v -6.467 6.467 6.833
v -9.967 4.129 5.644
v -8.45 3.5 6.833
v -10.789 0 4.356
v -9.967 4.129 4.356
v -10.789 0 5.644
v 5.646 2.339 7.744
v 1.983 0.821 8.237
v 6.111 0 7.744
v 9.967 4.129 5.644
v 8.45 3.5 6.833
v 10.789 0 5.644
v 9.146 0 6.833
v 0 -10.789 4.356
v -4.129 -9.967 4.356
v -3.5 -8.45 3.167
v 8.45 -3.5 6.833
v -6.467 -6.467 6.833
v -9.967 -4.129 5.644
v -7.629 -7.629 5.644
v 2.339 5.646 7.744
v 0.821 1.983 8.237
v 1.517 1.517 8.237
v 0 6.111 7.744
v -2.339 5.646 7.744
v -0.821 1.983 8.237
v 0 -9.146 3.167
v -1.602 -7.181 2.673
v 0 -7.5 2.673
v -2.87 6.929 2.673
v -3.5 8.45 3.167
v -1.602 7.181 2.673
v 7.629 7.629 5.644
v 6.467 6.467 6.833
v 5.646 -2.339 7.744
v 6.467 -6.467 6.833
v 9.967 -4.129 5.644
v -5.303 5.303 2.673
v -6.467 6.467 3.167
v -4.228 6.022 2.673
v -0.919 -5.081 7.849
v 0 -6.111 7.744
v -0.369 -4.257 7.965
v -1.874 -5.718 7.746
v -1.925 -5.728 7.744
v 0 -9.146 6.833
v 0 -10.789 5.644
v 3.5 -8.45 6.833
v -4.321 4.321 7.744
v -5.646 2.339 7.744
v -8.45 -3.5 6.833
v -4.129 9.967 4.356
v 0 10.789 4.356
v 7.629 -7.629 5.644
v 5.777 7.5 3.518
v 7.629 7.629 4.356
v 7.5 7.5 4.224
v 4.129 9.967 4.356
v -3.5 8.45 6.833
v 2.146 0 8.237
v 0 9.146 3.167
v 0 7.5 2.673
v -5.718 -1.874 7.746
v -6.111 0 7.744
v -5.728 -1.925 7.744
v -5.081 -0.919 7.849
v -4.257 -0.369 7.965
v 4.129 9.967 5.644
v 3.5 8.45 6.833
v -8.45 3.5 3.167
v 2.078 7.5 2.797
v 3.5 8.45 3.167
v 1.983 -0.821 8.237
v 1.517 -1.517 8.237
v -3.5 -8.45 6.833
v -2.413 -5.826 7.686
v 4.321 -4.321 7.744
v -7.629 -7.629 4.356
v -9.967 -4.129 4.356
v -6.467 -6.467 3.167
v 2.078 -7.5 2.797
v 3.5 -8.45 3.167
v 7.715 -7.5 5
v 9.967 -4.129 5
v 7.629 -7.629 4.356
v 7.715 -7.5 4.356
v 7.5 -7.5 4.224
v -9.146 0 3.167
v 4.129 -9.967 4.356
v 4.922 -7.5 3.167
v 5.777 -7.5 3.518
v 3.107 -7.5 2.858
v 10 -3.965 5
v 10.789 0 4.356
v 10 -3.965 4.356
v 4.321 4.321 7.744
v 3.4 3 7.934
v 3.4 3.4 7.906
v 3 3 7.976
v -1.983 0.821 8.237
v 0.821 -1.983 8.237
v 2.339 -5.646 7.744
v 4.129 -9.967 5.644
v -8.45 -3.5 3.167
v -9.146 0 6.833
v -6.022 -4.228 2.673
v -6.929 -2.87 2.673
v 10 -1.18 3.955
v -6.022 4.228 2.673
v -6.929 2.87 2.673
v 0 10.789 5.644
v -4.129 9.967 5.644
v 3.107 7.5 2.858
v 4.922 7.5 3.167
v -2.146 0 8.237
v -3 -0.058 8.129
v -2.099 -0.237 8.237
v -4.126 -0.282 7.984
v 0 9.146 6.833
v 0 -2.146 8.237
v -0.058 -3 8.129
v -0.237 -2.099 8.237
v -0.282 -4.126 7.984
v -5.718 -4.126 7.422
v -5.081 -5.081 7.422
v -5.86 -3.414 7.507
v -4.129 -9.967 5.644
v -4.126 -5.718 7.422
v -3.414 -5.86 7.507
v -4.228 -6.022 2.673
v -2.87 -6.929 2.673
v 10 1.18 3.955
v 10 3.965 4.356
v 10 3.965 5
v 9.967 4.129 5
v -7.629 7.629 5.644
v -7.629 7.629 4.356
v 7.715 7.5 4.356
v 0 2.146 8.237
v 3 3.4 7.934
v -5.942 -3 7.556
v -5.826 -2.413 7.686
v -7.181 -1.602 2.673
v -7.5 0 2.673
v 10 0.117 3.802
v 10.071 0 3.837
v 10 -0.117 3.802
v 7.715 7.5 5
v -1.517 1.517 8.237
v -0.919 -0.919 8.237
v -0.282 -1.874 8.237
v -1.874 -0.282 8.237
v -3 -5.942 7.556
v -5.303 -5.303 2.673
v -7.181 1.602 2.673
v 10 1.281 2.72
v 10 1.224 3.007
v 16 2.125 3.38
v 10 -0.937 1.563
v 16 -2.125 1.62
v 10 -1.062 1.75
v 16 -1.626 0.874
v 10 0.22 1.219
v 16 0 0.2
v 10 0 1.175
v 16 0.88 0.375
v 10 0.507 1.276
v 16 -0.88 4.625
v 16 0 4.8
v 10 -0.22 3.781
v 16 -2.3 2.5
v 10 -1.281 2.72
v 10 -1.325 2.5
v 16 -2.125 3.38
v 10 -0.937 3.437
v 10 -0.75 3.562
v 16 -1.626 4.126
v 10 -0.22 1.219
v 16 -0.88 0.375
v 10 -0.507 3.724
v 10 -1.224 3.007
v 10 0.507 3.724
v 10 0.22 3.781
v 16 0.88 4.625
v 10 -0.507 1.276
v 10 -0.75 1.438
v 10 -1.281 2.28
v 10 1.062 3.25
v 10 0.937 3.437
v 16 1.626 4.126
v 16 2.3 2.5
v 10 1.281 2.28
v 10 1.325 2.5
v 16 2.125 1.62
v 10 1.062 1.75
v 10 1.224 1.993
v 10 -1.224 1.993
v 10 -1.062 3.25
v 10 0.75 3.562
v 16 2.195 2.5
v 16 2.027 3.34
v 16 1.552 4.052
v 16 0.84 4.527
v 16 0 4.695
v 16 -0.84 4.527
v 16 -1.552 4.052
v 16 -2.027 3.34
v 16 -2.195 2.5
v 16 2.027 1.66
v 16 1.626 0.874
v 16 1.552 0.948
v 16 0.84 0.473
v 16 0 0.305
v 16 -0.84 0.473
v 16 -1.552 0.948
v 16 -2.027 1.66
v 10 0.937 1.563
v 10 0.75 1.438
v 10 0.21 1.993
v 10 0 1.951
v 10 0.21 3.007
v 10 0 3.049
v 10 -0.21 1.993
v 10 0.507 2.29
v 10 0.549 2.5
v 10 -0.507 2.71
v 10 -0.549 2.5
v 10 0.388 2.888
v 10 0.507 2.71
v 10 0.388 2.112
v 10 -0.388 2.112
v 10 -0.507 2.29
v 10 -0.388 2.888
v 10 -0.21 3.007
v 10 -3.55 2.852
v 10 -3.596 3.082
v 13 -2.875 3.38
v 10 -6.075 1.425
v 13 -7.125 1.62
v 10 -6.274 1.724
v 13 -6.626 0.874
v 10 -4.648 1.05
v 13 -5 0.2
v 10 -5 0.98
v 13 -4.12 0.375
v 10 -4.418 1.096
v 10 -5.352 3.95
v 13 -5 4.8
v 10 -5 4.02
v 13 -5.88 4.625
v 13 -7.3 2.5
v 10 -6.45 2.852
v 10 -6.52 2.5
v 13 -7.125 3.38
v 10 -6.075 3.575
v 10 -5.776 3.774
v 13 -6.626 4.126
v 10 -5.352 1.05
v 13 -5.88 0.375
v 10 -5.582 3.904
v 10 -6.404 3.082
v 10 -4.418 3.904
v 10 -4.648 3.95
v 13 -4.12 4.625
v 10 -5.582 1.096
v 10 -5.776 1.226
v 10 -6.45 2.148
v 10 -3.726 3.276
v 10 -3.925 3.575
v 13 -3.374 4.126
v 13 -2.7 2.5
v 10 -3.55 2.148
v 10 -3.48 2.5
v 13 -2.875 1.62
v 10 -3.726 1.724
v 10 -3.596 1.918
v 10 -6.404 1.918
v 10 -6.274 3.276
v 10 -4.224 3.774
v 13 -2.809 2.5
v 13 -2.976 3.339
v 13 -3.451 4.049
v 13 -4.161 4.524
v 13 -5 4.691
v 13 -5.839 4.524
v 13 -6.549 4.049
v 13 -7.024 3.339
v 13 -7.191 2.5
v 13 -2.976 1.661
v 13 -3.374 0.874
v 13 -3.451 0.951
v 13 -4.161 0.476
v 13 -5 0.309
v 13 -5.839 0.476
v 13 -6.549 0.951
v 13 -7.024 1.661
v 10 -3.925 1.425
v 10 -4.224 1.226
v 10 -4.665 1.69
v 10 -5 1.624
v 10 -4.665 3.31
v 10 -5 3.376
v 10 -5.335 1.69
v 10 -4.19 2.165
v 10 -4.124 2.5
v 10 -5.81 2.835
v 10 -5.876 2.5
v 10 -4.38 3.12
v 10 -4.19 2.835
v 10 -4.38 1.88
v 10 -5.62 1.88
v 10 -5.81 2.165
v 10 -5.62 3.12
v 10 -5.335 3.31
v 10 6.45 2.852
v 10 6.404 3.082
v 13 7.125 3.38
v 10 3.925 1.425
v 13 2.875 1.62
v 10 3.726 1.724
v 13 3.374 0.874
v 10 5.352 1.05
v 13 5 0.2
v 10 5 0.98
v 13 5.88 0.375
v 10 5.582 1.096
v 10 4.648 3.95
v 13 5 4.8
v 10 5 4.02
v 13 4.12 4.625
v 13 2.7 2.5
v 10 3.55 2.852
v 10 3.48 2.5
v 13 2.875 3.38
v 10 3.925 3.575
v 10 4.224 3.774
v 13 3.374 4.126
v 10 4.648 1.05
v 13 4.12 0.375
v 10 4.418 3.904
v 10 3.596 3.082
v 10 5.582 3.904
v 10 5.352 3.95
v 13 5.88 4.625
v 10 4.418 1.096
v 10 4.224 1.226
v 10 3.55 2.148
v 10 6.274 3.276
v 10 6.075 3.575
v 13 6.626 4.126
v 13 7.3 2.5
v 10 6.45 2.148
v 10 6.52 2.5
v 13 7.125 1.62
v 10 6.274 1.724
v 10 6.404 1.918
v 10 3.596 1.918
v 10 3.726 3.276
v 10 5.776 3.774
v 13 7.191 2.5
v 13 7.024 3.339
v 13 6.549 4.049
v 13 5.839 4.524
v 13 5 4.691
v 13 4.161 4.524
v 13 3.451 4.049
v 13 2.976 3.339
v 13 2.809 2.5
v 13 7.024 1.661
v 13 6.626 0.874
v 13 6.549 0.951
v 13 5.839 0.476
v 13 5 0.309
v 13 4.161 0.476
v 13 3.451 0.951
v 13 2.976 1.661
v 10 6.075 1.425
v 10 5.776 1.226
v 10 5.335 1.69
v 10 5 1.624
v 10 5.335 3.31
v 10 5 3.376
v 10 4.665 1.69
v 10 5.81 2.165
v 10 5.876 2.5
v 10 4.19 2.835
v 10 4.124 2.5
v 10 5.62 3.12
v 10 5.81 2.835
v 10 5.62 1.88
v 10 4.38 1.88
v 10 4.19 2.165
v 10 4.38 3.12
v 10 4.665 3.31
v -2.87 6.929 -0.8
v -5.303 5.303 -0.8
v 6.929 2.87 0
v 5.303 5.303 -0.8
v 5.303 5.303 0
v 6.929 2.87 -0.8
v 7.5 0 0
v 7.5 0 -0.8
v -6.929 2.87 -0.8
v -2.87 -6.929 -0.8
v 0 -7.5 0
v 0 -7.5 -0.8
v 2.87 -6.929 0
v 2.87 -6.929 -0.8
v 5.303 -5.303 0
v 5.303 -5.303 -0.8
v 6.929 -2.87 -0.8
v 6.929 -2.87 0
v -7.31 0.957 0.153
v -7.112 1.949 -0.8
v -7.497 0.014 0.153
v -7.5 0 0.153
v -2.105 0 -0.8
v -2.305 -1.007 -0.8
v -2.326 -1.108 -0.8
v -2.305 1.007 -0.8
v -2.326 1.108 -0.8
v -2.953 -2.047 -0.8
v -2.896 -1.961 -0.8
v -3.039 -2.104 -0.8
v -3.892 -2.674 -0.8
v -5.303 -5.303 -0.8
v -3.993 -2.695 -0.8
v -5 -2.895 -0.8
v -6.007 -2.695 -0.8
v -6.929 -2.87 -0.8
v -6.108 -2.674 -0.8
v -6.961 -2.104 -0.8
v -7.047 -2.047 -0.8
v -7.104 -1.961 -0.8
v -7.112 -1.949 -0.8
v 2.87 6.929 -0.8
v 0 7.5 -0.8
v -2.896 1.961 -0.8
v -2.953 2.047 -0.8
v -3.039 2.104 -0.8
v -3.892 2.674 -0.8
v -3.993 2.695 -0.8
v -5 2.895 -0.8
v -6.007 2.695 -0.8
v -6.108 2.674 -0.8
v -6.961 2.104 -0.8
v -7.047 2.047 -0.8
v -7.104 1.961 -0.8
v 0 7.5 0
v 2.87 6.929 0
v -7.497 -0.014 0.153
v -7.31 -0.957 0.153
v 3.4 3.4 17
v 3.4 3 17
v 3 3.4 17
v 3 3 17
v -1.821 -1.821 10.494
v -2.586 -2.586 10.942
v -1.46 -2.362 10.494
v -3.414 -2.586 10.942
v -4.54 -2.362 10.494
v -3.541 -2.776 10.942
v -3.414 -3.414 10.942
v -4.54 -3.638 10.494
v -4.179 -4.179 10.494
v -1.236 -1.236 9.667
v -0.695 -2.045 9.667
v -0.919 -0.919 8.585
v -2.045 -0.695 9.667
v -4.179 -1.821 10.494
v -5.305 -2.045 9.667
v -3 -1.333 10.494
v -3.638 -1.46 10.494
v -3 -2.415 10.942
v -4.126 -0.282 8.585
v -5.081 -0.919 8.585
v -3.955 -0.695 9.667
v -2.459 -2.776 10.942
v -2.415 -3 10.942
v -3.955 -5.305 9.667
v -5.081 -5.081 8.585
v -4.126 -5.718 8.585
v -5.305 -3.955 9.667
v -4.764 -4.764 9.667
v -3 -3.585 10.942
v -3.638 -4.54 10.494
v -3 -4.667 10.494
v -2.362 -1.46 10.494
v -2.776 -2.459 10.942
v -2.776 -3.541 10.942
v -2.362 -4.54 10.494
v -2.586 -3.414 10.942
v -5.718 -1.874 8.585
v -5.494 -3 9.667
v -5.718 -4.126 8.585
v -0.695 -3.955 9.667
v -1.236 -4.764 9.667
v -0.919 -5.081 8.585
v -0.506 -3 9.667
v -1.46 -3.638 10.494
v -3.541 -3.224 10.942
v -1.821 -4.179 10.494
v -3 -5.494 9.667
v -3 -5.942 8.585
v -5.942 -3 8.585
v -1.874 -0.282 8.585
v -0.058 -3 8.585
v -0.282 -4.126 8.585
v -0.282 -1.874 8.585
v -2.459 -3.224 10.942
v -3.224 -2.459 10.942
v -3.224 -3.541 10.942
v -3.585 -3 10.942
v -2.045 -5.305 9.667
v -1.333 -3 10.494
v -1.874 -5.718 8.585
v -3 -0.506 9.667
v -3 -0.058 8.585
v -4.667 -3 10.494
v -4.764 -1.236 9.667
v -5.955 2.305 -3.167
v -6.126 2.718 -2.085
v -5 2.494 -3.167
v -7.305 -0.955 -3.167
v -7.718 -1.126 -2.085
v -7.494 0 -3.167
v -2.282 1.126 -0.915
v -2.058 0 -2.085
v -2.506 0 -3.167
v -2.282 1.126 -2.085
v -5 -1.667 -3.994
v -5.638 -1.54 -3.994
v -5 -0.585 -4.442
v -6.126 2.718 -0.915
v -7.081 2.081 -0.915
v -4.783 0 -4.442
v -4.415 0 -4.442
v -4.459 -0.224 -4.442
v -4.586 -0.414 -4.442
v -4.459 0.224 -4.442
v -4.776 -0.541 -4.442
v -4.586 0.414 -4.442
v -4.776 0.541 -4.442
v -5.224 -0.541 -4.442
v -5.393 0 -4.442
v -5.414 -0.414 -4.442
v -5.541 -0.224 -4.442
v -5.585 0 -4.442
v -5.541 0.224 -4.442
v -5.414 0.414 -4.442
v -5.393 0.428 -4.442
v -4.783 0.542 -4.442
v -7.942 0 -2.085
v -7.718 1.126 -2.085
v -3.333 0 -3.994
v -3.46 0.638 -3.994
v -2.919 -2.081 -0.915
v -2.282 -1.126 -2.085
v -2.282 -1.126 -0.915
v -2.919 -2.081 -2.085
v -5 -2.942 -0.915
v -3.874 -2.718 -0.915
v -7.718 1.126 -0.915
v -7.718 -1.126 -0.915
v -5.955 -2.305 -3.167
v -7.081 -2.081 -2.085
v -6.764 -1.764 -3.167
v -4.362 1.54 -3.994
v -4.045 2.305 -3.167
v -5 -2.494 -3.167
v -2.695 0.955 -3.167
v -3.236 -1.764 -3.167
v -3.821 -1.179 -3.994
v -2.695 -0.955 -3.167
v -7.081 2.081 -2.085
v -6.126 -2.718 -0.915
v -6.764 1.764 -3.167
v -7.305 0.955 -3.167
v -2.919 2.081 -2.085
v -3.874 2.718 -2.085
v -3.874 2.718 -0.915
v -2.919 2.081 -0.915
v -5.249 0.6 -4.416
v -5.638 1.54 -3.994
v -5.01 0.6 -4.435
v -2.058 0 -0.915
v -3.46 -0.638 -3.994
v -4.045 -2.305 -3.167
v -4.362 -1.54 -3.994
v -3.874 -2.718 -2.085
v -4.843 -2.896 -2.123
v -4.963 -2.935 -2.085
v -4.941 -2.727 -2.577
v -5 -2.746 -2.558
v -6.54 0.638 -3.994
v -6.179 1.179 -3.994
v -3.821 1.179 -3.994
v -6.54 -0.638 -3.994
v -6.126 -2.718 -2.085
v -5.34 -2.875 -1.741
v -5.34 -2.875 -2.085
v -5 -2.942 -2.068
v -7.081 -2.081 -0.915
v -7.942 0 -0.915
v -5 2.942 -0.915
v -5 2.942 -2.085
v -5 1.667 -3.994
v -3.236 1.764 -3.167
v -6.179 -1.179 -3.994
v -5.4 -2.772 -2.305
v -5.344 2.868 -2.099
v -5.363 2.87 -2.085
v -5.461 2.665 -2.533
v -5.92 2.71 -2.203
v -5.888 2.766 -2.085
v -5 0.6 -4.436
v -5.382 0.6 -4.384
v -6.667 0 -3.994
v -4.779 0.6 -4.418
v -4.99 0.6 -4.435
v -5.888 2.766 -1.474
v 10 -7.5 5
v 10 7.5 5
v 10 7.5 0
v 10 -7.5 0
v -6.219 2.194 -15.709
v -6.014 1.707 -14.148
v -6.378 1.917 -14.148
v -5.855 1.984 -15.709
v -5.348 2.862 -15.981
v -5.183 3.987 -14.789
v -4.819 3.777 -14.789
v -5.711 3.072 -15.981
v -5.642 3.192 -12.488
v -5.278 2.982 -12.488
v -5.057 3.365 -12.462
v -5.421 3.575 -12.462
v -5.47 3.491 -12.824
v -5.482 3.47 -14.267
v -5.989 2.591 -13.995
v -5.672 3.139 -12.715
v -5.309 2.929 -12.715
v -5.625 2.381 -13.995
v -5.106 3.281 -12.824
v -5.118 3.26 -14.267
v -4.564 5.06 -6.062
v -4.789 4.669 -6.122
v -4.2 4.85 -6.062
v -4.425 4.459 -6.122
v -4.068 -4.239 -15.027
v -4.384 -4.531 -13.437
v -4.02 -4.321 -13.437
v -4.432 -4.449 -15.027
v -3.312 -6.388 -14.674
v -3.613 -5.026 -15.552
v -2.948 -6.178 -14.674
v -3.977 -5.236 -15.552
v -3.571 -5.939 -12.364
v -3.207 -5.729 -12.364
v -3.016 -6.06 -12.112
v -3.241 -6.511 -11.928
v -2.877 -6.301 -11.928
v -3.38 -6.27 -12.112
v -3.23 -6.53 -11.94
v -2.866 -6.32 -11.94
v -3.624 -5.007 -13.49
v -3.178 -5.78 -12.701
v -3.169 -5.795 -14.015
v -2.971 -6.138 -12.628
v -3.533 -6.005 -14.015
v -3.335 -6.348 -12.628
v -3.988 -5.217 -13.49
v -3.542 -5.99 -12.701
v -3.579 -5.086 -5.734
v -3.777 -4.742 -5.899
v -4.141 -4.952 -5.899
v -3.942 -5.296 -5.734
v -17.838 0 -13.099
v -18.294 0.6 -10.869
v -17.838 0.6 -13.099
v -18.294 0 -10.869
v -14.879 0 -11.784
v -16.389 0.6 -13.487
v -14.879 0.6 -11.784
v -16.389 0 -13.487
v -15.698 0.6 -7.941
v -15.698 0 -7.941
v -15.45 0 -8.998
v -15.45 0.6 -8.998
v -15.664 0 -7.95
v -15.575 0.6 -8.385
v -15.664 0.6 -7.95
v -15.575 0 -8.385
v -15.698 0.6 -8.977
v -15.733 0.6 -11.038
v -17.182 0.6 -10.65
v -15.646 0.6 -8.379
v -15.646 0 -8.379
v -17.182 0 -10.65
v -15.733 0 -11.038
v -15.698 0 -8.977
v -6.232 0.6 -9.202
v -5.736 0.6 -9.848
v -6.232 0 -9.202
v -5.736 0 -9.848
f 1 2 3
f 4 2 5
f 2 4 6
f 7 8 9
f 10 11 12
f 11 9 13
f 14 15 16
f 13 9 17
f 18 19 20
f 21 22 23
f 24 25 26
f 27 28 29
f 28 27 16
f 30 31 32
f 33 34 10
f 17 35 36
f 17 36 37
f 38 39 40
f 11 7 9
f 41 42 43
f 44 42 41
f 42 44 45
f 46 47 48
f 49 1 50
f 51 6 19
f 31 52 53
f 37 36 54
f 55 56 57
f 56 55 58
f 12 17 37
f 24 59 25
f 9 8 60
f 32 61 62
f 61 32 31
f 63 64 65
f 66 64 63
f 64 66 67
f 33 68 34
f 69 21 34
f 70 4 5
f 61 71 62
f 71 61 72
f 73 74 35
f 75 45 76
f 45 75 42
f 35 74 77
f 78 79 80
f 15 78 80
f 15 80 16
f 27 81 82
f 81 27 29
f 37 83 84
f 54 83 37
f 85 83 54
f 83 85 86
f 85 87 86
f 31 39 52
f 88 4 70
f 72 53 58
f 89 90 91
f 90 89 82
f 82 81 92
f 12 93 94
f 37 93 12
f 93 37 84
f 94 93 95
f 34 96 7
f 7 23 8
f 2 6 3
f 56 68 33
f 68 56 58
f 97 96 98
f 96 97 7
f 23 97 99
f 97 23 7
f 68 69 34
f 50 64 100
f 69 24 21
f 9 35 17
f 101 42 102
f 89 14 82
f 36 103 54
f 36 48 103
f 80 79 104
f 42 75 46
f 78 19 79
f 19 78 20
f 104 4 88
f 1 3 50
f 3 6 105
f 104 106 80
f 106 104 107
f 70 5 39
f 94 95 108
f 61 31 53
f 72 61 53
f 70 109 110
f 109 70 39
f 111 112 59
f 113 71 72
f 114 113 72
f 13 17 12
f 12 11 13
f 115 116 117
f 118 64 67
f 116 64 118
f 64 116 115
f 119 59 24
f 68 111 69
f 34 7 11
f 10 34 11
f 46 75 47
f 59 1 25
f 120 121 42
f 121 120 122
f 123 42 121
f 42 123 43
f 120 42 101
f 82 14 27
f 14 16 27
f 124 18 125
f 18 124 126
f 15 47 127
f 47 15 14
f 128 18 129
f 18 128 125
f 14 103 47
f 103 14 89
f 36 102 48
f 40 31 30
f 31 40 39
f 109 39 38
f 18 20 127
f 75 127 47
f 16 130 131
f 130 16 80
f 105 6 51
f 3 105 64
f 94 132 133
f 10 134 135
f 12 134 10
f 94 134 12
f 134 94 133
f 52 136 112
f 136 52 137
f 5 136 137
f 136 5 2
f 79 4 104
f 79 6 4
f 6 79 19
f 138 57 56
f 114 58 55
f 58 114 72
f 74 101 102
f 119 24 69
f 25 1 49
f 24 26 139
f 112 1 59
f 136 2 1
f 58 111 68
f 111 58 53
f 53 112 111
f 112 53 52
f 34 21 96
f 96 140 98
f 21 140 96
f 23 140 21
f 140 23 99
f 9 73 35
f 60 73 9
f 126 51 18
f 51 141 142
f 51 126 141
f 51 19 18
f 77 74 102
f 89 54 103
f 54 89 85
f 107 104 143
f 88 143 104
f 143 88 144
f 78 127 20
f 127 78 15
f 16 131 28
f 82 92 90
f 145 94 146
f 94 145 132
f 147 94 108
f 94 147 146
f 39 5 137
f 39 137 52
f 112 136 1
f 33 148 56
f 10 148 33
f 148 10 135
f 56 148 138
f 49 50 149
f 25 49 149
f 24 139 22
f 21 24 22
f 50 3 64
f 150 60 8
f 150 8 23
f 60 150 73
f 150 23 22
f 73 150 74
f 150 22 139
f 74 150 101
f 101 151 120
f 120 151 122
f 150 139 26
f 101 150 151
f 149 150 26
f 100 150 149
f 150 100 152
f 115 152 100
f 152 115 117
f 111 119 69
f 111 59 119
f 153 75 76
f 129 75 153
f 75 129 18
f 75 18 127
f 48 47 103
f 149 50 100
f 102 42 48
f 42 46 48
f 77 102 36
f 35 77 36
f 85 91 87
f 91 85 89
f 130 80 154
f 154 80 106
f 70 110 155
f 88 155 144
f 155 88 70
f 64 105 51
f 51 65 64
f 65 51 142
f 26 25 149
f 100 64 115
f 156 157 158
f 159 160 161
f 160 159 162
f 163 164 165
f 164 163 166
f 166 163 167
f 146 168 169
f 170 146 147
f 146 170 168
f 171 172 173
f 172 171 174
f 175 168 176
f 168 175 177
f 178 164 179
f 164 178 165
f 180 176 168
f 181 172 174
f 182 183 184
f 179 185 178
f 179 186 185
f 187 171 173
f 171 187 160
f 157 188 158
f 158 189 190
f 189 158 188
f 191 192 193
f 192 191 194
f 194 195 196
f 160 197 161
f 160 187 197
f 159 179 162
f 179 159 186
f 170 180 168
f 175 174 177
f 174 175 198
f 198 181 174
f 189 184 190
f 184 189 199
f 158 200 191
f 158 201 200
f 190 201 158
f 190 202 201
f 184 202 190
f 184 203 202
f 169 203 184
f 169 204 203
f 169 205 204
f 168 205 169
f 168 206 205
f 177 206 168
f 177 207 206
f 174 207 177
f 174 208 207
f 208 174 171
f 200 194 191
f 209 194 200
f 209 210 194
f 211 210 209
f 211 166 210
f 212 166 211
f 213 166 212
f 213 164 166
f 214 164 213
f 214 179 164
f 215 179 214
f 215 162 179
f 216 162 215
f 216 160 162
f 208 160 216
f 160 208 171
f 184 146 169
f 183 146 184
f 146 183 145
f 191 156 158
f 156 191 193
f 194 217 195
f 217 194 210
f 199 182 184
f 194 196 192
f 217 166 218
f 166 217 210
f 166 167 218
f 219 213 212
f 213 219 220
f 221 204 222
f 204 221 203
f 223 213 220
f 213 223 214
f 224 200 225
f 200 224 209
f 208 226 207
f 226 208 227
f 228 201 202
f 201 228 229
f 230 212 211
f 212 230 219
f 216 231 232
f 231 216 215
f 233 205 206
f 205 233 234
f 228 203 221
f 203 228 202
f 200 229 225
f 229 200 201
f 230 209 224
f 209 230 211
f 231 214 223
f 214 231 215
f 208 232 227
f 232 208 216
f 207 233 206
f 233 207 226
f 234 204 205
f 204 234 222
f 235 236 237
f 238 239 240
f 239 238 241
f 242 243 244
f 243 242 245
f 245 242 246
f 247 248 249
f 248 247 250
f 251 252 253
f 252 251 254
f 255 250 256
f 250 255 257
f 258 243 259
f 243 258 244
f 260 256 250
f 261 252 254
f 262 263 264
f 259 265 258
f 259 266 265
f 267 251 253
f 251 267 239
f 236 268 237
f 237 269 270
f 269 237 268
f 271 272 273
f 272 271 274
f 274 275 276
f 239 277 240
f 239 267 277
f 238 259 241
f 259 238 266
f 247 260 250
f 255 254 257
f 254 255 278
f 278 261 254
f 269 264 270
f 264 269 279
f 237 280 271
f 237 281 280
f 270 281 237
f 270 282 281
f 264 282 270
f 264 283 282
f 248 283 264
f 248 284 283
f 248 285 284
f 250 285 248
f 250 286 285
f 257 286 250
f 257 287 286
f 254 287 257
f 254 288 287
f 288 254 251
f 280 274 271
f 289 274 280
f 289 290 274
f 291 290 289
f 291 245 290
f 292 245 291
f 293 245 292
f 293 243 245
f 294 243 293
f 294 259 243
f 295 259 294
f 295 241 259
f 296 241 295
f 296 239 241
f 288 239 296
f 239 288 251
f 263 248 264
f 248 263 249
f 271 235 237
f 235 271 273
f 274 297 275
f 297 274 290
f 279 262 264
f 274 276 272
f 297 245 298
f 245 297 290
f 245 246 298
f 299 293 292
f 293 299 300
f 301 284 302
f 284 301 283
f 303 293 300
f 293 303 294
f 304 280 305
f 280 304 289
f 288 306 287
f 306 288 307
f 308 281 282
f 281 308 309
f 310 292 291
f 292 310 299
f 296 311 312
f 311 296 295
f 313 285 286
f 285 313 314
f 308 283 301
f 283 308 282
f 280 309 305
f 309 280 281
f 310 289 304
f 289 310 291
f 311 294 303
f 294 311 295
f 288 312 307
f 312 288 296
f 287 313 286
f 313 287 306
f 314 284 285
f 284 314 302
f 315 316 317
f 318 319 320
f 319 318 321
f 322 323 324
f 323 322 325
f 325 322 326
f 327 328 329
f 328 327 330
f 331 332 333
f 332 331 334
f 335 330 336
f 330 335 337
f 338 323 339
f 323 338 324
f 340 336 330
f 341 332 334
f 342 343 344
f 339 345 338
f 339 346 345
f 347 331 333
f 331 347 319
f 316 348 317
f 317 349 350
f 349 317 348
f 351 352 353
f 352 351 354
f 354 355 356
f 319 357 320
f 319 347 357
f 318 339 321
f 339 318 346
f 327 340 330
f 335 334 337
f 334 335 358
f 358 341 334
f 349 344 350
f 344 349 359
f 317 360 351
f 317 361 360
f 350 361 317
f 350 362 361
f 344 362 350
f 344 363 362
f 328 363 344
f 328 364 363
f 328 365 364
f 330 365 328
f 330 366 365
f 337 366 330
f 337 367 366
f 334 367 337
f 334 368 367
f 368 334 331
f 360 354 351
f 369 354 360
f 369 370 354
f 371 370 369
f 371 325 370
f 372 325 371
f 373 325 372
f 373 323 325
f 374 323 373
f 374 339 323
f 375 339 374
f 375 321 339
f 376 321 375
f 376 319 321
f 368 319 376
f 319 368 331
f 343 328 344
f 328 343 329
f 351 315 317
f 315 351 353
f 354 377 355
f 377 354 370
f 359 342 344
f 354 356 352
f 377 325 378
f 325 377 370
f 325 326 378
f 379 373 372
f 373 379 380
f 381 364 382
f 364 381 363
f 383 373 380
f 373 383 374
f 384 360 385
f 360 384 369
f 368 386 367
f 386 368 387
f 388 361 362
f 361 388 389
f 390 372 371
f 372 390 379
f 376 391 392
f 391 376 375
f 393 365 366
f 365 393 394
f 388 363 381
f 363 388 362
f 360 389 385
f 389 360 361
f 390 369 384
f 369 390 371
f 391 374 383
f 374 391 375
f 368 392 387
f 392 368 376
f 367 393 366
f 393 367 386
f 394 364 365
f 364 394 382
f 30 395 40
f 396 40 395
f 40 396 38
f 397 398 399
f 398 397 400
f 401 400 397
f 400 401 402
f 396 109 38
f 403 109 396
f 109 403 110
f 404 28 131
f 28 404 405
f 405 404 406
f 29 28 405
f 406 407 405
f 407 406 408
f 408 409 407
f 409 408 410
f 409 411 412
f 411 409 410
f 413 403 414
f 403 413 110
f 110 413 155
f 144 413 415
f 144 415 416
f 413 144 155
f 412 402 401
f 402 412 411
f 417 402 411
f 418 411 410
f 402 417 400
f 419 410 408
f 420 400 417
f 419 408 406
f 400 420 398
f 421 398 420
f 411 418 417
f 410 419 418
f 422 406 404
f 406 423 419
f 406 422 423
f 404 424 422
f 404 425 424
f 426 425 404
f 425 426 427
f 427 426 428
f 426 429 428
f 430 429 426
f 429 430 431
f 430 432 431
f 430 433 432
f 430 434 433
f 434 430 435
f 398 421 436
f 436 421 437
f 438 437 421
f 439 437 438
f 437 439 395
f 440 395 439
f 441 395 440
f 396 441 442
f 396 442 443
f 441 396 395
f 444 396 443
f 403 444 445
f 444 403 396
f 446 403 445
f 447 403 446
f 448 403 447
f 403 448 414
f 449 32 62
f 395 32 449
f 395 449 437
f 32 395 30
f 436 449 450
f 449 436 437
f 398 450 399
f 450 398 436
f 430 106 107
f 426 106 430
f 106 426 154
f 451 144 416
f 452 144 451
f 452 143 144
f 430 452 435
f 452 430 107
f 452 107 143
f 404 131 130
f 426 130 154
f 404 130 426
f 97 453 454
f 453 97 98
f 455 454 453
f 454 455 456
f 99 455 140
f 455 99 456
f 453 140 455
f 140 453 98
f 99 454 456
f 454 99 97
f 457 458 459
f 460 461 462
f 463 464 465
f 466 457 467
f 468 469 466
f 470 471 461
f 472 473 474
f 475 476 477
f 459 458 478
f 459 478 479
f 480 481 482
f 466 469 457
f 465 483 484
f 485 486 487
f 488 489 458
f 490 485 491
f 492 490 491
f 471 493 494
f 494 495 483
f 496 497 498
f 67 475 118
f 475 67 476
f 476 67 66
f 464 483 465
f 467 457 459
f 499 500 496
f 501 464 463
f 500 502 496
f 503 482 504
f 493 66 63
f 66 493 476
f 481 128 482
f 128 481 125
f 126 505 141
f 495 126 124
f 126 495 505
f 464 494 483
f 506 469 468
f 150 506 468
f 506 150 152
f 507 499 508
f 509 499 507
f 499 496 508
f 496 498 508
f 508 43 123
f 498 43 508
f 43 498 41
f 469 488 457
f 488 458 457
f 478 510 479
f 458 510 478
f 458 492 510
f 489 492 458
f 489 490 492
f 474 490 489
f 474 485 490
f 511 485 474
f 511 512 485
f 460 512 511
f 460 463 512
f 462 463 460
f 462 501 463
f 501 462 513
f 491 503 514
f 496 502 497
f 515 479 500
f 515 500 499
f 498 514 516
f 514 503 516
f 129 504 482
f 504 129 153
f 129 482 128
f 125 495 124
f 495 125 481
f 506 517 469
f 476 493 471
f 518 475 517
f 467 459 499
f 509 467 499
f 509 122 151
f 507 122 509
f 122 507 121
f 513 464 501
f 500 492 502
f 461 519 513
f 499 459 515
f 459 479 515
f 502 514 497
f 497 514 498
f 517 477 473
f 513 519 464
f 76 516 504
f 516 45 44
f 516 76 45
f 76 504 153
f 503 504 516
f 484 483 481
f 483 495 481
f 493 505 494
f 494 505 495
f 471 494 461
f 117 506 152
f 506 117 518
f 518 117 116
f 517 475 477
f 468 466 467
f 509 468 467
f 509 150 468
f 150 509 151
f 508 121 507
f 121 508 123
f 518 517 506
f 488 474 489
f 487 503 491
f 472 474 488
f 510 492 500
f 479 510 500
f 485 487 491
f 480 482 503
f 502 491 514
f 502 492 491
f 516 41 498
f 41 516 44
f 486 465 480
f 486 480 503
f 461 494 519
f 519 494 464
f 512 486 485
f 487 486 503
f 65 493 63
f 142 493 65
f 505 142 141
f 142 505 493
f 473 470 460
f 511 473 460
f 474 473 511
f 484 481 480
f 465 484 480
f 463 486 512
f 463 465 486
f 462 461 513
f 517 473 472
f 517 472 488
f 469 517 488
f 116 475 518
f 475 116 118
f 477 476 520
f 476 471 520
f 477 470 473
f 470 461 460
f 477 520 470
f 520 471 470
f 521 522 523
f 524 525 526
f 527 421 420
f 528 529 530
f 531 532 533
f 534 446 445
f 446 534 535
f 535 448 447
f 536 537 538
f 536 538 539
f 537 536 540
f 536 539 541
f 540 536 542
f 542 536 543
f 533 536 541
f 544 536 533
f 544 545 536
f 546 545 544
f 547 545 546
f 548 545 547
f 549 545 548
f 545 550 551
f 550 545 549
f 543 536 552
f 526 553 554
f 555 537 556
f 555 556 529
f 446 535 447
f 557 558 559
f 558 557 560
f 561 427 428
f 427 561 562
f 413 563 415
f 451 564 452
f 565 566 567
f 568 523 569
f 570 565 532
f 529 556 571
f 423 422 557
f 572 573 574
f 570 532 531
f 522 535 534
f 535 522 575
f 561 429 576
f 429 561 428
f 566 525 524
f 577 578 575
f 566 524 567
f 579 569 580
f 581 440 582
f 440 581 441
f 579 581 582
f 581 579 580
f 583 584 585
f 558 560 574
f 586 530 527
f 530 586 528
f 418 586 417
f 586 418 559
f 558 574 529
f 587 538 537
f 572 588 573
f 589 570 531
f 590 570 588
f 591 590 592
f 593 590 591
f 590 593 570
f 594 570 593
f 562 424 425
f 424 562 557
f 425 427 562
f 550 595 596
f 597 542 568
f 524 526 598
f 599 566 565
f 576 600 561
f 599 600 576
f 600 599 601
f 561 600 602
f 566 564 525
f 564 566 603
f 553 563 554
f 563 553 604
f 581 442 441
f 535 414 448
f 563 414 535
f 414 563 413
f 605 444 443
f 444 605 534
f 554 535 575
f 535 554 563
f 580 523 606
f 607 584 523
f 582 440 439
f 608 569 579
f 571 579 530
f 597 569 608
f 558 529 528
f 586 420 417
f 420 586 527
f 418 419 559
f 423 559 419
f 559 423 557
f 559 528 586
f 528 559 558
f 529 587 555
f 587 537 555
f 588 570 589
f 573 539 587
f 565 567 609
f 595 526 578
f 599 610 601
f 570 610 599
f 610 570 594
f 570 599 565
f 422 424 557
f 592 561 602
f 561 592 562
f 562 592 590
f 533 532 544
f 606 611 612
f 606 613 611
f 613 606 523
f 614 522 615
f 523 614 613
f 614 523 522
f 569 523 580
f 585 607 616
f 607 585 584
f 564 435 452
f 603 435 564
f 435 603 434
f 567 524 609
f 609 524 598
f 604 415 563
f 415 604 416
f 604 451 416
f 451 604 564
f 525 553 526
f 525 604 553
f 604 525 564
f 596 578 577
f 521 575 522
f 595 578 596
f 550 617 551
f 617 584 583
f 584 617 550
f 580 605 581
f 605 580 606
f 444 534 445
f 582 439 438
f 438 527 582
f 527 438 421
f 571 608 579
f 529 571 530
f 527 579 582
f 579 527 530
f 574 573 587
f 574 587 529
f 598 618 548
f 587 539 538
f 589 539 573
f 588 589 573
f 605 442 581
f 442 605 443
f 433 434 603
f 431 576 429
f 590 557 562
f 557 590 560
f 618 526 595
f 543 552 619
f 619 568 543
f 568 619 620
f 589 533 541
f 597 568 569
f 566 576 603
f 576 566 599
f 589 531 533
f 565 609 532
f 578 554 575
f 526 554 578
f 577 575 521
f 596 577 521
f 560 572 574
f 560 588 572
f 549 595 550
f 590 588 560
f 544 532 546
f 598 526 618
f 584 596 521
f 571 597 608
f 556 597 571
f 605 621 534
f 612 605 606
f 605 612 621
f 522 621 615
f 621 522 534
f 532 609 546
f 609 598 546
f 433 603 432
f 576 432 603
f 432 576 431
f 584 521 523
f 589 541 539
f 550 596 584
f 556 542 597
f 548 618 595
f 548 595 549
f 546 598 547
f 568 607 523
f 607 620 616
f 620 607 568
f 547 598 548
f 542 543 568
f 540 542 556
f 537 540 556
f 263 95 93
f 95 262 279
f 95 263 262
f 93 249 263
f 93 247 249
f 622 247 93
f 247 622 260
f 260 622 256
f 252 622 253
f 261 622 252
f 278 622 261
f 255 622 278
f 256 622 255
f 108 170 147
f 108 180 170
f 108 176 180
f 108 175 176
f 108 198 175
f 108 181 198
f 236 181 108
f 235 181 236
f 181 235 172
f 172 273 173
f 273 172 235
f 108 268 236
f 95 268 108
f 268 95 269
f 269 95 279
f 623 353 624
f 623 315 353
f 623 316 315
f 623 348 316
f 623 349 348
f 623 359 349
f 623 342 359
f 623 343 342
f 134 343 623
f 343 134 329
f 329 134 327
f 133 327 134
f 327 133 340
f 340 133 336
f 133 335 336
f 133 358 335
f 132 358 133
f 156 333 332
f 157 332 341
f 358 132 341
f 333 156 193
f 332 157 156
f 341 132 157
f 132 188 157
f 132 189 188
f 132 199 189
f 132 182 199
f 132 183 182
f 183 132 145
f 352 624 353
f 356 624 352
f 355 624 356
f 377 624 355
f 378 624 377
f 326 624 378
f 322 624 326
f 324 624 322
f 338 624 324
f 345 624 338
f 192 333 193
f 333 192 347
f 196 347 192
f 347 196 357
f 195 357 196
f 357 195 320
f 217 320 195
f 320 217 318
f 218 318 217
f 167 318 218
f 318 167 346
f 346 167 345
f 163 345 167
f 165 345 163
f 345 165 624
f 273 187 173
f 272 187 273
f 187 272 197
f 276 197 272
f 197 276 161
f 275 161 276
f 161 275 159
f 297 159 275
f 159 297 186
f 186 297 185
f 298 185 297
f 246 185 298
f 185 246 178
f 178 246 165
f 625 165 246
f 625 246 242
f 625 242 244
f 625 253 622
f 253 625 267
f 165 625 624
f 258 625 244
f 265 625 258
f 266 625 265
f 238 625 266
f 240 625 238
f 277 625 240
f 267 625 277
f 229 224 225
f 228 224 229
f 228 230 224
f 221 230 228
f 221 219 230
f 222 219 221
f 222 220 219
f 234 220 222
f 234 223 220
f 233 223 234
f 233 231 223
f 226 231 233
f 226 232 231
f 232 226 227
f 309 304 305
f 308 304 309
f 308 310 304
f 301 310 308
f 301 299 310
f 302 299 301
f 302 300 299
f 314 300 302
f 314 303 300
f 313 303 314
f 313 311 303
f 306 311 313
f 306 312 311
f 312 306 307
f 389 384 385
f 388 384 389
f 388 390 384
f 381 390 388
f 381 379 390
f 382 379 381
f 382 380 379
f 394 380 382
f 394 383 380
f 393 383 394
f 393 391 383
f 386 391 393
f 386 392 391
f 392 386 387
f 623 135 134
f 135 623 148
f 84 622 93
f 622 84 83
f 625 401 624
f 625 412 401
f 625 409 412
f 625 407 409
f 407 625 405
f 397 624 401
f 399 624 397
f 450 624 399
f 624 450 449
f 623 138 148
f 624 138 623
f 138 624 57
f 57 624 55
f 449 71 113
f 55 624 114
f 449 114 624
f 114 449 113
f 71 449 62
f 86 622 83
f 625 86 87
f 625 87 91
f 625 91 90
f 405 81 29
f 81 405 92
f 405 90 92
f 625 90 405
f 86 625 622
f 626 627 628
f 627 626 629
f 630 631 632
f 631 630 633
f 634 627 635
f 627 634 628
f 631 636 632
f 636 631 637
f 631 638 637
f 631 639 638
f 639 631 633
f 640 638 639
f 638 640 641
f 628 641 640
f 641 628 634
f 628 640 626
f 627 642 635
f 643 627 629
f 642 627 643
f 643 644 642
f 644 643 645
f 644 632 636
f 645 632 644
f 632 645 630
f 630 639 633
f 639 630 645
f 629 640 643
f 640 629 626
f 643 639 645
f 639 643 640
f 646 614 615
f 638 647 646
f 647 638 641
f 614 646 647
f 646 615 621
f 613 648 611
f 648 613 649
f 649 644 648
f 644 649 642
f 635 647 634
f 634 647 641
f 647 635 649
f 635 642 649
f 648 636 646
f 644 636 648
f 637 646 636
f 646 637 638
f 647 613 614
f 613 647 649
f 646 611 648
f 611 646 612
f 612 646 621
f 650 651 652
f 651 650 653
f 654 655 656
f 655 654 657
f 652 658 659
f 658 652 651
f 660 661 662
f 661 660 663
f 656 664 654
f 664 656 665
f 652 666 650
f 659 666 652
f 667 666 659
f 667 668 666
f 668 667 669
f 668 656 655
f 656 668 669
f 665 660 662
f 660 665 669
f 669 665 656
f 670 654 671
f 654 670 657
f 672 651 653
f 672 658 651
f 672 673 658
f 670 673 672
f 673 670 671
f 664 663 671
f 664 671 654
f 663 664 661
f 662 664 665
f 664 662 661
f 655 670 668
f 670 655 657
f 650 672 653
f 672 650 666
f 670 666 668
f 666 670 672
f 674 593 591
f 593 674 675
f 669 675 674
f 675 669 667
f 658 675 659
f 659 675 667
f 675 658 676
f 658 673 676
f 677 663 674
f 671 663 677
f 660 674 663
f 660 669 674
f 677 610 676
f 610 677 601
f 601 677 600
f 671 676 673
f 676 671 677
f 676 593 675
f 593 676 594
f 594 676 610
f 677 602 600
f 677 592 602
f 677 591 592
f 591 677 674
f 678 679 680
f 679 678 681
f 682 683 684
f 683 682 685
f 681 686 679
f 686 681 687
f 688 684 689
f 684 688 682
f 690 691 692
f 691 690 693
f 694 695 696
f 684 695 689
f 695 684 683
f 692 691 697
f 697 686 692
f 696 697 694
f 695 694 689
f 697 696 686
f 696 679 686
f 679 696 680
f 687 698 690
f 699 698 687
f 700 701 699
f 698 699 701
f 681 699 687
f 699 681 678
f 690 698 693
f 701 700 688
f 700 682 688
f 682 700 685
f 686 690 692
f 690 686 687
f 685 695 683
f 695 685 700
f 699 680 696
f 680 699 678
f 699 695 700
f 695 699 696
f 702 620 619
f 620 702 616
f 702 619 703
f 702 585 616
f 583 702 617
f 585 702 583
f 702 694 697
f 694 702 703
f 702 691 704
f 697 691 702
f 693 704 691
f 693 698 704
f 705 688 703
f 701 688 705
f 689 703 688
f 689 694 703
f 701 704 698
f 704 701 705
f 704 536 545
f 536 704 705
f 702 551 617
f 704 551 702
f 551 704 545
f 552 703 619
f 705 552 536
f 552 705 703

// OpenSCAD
$fn=16; 

module gripper()
{
	translate(v = [2.5, 0.3, -0.25])
		difference() {
			scale(v = [1, 1, 0.5])
				rotate(a = 45, v = [0, 1, 0])
					cube(size = [5, 0.6, 5], center = true);
			translate(v = [-6, 0, 0])
				cube(size = [5, 5, 5], center = true);
			translate(v = [2, 0, 0])
				cube(size = [5, 1.5, 1.5], center = true);
		}
}

module leg(angle)
{
	rotate(a = 180, v = [0, 1, ])
	union() {
		cube(size = [0.6, 0.6, 10], center = false);
		translate(v = [0, 0, 10]) {
			rotate(a = angle, v = [0, 1, 0])
				cube(size = [0.6, 0.6, 10], center = false);
			translate(v = [cos(90 - angle) * 10, 0, sin(90 - angle) * 10])
				rotate(a = -angle, v = [0, 1, 0])
					gripper();
		}
	}
}

module legset()
{
	scale(v = [0.7, 0.7, 0.7])
	rotate(a = 60, v = [0, 0, 1])
		translate(v = [3, 0, 0])
		rotate(a = -30, v = [0, 1, 0])
			leg(45);
	scale(v = [0.7, 0.7, 0.7])
	rotate(a = -60, v = [0, 0, 1])
		translate(v = [3, 0, 0])
		rotate(a = -35, v = [0, 1, 0])
			leg(25);
	rotate(a = 0, v = [0, 0, 1])
		translate(v = [3, 0, 0])
		rotate(a = 10, v = [0, 1, 0])
			leg(85);
}

module main_body()
{
	union() {
		difference() {
			translate(v = [0, 0, 5])
				scale(v = [1, 1, 0.3])
				sphere(r = 11);
			translate(v = [0, 0, -10.1])
				cube(size = [20, 20, 20], center = true);
		}
		translate(v = [0, 0, 1.2])
			cylinder(h = 4, r1 = 7.5, r2 = 7.5, center = true);
		translate(v = [3, 3, 2])
			cube(size = [0.4, 0.4, 15]);
			/* cylinder(h = 15, r1 = 0.4, r2 = 0.4); */
		translate(v = [-3, -3, 8])
			sphere(r = 3);
		translate(v = [-5, 0, -1.5])
			sphere(r = 3);
		translate(v = [5, 0, 2.5])
			cube(size = [10, 15, 5], center = true);
		translate(v = [8, 0, 2.5])
		rotate(a = 90, v = [0, 1, 0]) 
			difference() {
				cylinder(h = 8, r1 = 1, r2 = 2.3);
				cylinder(h = 8.02, r1 = 0, r2 = 2.2);
			}
		translate(v = [8, -5, 2.5])
		rotate(a = 90, v = [0, 1, 0]) 
			difference() {
				cylinder(h = 5, r1 = 1, r2 = 2.3);
				cylinder(h = 5.02, r1 = 0, r2 = 2.2);
			}
		translate(v = [8, 5, 2.5])
		rotate(a = 90, v = [0, 1, 0])
			difference() {
				cylinder(h = 5, r1 = 1, r2 = 2.3);
				cylinder(h = 5.02, r1 = 0, r2 = 2.2);
			}
	}
}

main_body();
translate(v = [-7, 0, 0])
	legset();
